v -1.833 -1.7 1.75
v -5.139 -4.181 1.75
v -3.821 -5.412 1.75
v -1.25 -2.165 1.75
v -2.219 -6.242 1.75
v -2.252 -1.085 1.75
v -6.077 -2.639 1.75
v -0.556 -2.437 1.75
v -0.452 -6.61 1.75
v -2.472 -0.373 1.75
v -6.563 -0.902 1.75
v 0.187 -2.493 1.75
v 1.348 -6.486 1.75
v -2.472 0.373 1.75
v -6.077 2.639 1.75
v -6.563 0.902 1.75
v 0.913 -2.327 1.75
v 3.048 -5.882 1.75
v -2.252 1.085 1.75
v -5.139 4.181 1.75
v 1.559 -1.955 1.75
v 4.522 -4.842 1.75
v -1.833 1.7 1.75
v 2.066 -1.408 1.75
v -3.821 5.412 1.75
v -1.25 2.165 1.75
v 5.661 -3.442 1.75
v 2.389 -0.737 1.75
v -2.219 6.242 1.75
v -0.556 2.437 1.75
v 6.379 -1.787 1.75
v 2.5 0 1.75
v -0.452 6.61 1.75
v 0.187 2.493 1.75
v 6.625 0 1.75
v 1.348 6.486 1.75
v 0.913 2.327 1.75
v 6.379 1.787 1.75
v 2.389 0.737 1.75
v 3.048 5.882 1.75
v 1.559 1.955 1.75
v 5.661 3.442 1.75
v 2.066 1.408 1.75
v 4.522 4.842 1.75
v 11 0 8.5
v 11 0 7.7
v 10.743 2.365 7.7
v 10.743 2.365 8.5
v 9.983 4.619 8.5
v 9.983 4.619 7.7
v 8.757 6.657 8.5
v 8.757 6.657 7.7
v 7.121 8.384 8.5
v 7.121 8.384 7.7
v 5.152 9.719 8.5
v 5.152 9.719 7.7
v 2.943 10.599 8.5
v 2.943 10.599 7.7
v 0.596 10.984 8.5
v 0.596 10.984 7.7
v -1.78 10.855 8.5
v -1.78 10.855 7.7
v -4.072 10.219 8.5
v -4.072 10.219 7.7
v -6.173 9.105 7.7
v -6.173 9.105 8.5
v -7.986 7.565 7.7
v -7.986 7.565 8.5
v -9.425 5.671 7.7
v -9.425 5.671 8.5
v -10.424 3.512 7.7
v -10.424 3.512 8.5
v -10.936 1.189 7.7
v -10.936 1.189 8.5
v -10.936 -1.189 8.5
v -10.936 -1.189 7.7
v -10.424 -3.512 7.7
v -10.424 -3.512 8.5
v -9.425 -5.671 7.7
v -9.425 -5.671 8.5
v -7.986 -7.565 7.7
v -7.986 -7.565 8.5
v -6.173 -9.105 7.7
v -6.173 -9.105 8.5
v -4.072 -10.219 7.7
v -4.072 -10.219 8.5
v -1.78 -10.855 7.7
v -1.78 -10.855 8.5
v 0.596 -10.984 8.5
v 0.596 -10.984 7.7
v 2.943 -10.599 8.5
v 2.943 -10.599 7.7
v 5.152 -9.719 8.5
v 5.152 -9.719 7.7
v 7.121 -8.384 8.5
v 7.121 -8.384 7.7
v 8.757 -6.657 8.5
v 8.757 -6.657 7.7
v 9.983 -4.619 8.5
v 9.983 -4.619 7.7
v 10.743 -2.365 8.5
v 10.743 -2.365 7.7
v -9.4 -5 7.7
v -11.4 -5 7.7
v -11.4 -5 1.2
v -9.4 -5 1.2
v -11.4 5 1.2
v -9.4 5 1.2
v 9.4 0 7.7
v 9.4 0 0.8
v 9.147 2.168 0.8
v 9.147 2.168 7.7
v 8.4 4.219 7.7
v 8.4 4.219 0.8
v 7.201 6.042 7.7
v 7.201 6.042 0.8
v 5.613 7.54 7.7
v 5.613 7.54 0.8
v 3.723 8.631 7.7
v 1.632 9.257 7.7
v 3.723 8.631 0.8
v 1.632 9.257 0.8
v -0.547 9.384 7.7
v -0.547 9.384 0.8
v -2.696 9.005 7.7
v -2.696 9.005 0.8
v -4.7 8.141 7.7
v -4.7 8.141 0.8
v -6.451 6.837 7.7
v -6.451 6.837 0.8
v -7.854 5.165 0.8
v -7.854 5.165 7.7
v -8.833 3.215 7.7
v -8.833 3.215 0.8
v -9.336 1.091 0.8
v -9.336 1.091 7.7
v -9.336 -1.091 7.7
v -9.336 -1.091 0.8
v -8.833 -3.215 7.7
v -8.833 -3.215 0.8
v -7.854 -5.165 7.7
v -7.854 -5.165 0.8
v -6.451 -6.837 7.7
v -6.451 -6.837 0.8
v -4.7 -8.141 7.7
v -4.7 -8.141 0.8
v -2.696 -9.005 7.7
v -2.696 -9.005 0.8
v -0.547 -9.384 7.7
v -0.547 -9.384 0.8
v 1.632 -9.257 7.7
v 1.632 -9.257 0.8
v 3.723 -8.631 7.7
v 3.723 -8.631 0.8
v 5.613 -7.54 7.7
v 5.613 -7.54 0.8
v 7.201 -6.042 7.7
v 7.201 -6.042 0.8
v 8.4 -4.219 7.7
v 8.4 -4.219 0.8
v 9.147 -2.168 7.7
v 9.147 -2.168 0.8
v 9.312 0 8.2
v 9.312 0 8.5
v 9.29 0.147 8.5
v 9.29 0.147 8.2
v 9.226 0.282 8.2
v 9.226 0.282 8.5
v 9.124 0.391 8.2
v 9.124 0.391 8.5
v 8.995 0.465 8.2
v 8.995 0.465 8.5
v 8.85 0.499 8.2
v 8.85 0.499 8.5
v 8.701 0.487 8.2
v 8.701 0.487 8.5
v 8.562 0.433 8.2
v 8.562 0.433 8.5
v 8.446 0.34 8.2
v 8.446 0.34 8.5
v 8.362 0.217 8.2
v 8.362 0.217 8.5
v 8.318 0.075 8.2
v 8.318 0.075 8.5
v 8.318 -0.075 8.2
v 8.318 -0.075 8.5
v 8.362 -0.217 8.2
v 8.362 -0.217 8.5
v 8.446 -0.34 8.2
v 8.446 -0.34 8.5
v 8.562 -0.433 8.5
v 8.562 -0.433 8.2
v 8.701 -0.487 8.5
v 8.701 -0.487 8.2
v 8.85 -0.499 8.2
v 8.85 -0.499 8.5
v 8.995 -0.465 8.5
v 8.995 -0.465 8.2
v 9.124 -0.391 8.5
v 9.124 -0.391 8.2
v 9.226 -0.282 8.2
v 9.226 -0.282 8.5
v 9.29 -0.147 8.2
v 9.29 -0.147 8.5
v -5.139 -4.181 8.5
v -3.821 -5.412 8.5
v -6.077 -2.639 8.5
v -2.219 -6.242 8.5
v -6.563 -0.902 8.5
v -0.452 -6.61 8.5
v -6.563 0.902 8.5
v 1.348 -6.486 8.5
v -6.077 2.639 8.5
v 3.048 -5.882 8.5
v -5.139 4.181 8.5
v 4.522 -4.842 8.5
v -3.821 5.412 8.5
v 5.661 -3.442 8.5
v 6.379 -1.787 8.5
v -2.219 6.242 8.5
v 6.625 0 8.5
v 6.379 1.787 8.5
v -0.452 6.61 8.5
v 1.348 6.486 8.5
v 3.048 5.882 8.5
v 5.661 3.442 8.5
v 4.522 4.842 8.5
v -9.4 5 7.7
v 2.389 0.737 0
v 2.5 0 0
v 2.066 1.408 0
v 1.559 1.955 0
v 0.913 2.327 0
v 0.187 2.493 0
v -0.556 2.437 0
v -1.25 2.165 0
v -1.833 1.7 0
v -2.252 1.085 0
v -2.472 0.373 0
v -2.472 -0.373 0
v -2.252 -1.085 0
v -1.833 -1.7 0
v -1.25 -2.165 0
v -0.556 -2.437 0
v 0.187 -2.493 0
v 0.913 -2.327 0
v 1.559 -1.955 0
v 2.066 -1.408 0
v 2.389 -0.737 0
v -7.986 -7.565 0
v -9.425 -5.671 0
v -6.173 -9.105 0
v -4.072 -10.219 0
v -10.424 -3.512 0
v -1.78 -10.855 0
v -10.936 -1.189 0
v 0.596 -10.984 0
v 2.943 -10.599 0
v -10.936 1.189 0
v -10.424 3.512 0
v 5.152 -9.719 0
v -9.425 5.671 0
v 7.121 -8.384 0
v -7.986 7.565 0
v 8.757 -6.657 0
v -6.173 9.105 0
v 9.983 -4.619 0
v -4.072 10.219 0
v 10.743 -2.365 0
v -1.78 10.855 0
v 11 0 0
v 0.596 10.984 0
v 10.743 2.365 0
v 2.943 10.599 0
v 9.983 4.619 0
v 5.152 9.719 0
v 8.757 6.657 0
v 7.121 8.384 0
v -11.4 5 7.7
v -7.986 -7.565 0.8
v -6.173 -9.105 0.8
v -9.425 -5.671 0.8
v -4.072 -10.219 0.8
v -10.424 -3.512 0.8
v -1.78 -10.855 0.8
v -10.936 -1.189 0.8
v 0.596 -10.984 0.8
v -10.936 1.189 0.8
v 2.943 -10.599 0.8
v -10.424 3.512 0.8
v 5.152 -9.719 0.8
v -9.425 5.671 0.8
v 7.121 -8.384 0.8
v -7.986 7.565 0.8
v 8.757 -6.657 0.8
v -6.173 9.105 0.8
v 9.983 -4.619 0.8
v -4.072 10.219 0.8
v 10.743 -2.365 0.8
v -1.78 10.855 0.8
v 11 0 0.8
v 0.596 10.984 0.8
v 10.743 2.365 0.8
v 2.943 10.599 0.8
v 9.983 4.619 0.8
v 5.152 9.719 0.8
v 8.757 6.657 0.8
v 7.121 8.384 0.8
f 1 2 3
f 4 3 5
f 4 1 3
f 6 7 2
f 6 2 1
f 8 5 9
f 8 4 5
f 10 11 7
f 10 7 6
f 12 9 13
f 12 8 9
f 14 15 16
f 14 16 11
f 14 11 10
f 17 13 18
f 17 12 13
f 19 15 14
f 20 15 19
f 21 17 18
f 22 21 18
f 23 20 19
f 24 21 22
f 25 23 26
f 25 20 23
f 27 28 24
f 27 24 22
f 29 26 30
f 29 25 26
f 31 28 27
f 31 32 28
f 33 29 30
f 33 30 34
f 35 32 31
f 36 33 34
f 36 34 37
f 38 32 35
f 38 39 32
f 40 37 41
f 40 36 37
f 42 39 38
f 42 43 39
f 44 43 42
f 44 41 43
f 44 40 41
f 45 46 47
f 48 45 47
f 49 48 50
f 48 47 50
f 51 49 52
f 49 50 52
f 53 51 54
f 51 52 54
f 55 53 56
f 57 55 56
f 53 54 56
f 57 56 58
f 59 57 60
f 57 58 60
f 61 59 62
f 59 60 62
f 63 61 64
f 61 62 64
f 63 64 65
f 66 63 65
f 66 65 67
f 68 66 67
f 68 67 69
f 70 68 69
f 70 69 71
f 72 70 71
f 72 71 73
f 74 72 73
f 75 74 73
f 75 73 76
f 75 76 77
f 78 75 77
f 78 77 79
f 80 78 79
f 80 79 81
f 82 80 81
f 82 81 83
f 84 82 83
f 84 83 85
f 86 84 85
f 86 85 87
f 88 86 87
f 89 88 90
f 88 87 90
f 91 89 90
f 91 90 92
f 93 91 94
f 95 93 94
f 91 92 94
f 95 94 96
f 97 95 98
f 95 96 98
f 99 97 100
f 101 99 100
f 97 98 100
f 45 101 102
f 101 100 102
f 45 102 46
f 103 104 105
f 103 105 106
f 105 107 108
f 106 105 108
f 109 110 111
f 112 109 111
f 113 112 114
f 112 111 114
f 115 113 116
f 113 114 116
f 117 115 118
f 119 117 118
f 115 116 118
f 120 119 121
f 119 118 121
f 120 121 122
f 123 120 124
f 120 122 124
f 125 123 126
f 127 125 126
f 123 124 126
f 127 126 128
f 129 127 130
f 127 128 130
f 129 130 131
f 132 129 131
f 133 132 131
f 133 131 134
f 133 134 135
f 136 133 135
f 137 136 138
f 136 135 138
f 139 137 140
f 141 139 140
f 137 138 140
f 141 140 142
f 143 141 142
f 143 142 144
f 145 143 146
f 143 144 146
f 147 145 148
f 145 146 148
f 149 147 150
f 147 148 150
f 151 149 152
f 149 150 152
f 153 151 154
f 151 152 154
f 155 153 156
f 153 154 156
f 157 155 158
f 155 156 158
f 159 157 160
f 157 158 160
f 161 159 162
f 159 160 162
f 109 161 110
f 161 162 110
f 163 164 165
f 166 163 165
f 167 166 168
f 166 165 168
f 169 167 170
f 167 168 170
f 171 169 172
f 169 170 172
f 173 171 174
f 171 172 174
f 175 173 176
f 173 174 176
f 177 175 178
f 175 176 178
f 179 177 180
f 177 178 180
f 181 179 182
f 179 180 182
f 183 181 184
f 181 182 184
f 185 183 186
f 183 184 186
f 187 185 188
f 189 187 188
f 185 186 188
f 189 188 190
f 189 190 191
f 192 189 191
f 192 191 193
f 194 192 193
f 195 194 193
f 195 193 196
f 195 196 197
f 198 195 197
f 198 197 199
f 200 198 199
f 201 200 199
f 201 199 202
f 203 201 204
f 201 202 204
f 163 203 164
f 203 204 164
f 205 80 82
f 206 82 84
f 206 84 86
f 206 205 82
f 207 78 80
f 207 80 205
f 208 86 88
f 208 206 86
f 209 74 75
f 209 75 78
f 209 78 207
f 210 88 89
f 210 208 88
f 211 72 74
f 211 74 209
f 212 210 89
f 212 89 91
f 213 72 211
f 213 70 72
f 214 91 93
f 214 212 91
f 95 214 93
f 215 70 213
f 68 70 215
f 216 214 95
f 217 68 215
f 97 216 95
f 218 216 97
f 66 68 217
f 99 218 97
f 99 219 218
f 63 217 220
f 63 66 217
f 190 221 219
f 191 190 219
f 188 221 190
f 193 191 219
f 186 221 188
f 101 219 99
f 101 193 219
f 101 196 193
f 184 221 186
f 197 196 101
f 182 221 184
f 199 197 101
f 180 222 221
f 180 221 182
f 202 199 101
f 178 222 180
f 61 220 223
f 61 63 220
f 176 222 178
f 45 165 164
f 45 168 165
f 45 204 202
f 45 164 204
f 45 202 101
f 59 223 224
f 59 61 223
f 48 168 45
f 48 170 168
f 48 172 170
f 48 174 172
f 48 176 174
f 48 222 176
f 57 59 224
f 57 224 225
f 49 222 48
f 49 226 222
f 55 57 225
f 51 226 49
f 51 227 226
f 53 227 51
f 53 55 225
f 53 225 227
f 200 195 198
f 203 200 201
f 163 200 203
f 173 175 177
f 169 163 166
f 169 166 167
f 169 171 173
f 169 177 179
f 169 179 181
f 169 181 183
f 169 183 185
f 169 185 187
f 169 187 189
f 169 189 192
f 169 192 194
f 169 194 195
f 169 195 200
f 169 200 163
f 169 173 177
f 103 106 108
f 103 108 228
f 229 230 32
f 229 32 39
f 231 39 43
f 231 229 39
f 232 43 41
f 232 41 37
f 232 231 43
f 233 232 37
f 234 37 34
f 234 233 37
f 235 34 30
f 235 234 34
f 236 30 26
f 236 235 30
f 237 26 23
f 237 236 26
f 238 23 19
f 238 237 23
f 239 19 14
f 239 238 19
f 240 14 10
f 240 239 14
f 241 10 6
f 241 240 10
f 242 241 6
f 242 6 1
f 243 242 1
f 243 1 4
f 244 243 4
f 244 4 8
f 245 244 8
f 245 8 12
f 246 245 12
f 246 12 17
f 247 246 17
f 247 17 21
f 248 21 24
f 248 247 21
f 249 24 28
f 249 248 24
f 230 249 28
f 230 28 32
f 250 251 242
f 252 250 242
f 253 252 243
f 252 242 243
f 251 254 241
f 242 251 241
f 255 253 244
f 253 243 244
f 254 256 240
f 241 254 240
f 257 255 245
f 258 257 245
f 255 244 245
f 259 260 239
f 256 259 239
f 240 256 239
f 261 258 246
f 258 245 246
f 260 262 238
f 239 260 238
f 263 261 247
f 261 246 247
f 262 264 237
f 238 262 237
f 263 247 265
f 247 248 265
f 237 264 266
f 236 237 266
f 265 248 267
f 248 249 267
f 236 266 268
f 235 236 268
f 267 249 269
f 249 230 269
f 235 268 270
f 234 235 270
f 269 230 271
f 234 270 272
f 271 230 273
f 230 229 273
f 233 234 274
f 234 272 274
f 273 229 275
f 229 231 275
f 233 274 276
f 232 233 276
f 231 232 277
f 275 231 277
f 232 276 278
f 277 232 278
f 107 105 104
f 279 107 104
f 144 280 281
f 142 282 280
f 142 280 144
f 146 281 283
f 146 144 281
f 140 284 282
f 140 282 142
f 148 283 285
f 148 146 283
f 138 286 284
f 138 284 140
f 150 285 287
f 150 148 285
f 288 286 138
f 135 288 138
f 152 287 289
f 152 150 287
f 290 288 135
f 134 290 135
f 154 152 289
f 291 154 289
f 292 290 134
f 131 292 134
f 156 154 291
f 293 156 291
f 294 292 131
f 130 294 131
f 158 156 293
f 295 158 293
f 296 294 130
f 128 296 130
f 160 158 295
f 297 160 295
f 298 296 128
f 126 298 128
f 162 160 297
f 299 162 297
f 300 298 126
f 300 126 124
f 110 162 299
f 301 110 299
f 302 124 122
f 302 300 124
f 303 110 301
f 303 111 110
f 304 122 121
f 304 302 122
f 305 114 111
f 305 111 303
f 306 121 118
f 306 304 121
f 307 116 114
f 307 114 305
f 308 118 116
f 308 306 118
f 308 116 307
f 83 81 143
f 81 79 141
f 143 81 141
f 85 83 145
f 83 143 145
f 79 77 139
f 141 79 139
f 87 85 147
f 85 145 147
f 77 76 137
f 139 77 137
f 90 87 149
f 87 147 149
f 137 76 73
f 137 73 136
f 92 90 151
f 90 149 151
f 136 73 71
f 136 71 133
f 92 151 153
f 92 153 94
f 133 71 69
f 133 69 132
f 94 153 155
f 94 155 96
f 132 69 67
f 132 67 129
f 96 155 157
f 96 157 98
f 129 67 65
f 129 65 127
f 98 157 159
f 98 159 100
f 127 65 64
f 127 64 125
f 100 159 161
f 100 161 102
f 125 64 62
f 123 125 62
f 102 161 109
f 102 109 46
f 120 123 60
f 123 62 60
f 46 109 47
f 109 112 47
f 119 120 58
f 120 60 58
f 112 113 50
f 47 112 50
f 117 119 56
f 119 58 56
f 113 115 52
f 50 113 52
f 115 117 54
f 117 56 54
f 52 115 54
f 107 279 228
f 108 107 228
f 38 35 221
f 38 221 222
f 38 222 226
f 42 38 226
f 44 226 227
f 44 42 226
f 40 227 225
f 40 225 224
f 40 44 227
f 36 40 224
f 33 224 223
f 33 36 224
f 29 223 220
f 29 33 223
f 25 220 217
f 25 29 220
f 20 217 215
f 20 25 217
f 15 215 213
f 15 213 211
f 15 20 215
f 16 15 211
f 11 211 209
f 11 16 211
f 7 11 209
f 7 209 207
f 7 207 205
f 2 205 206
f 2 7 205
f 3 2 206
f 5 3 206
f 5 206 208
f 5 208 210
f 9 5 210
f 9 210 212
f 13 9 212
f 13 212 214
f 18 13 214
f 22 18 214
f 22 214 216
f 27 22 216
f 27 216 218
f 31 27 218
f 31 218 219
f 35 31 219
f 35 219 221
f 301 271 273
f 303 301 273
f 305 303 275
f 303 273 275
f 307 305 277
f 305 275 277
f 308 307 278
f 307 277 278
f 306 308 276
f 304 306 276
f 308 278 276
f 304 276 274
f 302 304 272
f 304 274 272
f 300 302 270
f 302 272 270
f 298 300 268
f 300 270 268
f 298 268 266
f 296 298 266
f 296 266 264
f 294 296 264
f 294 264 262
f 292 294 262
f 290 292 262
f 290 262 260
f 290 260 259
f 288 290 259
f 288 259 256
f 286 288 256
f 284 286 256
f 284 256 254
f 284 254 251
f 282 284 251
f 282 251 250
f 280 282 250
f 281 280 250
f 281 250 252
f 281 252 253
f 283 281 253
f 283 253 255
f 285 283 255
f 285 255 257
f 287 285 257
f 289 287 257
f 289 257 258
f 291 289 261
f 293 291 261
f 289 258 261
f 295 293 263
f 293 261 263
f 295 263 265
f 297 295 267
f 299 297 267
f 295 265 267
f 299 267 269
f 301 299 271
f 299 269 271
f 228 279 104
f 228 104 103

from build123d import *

# Parameters (mm, degrees)
F1_R      = 11
F1_R_2    = 6.625
F2_DEPTH  = 8.5
F3_R      = 6.625
F3_R_2    = 2.5
F5_DEPTH  = 1.75
F9_R      = 11
F9_R_2    = 9.4
F10_DEPTH = 6.9
F11_R     = 0.5
F12_DEPTH = 0.3
F13_W     = 2
F13_H     = 6.5
F14_DEPTH = 5


with BuildPart() as f2:
    # F1 (on Top) → F2 (new body)
    with BuildSketch(Plane.XY):
        Circle(F1_R)
        Circle(F1_R_2, mode=Mode.SUBTRACT)
    extrude(amount=F2_DEPTH)

    # F3 (on Top) → F5 (join)
    with BuildSketch(Plane.XY):
        Circle(F3_R)
        Circle(F3_R_2, mode=Mode.SUBTRACT)
    extrude(amount=F5_DEPTH)

    # F9 (on offset) → F10 (cut)
    with BuildSketch(Plane.XY.offset(0.8)):
        Circle(F9_R)
        Circle(F9_R_2, mode=Mode.SUBTRACT)
    extrude(amount=F10_DEPTH, mode=Mode.SUBTRACT)

    # F11 (on face) → F12 (cut)
    with BuildSketch(Plane.XY.offset(8.5)):
        with Locations((8.8125, 0)):
            Circle(F11_R)
    extrude(amount=-F12_DEPTH, mode=Mode.SUBTRACT)


with BuildPart() as f14:
    # F13 (on Front) → F14 (new body, symmetric)
    with BuildSketch(Plane.XZ):
        with Locations((-10.4, 4.45)):
            Rectangle(F13_W, F13_H)
    extrude(amount=F14_DEPTH, both=True)


solid = Compound([f2.part, f14.part])
